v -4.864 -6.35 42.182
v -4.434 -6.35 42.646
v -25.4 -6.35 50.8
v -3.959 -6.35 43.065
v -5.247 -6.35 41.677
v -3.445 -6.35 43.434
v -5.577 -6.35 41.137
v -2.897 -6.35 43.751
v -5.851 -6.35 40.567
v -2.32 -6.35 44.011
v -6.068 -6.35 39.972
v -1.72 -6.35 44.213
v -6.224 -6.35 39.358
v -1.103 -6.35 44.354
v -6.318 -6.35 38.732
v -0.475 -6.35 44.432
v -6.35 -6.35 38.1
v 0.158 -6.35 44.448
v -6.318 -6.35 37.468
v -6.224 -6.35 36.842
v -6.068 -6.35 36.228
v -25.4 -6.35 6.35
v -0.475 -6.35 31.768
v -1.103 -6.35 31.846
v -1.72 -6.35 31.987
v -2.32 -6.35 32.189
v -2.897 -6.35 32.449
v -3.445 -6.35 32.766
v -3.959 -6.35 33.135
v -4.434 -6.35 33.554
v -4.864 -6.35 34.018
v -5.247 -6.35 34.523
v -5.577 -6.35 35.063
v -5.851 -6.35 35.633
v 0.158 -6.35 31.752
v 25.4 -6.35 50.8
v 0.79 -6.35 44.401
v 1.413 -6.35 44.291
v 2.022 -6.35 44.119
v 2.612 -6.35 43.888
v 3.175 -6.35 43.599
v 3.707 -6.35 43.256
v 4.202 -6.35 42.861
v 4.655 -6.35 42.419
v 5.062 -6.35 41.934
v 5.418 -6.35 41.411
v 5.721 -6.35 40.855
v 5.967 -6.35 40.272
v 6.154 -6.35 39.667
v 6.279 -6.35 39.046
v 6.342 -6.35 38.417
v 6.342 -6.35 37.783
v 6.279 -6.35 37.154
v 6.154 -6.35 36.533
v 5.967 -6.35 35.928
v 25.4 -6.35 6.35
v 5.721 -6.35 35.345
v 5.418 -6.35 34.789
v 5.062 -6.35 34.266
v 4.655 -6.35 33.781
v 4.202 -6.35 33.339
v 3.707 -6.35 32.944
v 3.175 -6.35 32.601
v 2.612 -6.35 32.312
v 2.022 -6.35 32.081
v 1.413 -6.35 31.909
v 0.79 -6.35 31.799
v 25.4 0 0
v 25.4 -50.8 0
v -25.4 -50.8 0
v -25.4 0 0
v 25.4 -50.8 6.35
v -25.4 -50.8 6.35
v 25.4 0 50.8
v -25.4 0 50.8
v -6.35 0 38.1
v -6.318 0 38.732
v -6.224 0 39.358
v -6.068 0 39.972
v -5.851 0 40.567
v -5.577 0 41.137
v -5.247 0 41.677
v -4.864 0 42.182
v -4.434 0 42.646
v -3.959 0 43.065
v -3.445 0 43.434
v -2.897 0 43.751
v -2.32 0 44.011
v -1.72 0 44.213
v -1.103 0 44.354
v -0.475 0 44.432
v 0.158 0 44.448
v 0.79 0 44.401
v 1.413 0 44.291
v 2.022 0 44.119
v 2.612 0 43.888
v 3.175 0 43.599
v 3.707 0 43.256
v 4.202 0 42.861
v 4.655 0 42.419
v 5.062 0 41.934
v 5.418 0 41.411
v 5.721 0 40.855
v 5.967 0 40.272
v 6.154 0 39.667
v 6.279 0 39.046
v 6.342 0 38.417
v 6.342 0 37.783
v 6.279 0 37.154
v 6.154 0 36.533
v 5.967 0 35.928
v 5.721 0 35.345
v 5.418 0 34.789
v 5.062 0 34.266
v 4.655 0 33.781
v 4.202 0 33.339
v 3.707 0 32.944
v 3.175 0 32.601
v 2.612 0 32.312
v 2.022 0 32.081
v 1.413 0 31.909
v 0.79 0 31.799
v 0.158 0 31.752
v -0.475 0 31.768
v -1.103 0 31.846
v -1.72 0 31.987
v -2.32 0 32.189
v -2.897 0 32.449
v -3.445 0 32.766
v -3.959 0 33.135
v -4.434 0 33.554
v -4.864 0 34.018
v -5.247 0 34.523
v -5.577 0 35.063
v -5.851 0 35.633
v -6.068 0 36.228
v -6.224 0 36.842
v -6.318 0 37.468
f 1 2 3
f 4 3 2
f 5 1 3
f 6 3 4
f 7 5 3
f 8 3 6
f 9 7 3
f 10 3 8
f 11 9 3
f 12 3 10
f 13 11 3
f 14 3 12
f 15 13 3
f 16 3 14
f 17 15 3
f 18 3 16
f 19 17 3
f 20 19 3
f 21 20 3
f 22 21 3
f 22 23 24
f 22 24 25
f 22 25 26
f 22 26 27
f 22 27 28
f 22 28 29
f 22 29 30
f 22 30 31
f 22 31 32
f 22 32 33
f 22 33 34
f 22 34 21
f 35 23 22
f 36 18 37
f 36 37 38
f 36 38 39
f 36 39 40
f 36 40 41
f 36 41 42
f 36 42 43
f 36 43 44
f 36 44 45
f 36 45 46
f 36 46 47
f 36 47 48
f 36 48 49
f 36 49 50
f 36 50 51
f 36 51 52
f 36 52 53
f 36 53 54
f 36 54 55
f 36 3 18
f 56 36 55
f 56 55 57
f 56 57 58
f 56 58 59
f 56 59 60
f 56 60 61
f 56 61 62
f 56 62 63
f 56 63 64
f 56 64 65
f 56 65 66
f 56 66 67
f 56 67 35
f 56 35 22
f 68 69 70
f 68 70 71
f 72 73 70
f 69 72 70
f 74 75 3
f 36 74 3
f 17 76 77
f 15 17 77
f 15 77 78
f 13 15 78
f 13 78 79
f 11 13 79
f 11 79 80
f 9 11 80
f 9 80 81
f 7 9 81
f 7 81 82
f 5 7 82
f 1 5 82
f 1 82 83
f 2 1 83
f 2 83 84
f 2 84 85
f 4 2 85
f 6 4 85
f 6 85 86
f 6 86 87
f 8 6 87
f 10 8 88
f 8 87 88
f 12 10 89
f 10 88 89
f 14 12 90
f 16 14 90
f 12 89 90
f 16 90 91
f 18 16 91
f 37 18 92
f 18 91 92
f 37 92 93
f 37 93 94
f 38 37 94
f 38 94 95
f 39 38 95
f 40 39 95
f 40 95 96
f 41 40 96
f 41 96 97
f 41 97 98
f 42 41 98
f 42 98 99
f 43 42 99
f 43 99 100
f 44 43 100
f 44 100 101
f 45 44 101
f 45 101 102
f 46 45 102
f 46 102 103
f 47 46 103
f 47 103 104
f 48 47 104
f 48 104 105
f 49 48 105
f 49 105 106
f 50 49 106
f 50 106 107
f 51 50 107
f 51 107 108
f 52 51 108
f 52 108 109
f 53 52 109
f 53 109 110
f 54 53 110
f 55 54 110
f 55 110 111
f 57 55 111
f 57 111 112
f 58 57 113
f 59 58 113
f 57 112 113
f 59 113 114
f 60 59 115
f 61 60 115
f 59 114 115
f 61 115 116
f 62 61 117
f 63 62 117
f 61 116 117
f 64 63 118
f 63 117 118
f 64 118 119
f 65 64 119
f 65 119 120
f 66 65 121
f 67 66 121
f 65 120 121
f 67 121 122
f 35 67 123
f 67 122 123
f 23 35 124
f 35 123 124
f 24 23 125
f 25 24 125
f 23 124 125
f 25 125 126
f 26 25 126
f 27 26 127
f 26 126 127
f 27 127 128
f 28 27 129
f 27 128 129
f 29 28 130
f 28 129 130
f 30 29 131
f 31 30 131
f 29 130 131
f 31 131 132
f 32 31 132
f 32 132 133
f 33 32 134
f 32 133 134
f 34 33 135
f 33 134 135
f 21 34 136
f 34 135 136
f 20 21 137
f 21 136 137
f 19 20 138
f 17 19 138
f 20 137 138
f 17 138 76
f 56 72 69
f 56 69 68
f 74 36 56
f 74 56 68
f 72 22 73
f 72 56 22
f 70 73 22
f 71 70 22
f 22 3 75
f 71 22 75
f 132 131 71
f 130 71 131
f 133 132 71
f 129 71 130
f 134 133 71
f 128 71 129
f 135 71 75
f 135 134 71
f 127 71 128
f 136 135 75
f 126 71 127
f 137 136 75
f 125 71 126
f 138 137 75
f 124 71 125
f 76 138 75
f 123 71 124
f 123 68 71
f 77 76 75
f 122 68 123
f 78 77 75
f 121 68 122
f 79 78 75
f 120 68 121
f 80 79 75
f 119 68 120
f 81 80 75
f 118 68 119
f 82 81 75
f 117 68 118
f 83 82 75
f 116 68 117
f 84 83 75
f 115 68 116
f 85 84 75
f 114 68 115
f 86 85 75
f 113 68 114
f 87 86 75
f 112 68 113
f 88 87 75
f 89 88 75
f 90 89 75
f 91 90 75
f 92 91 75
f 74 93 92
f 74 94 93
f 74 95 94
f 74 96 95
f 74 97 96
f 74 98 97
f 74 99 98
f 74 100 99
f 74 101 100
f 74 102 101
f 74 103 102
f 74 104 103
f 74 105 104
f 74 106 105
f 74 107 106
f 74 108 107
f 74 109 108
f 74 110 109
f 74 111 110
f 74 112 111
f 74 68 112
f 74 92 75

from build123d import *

# Parameters (mm, degrees)
F1_DEPTH = 25.4
F3_D     = 12.7


with BuildPart() as f1:
    # F0 (on Right) → F1 (new body, symmetric)
    with BuildSketch(Plane.YZ):
        Polygon((-50.8, 6.35), (-50.8, 0), (0, 0), (0, 50.8), (-6.35, 50.8), (-6.35, 6.35), align=None)
    extrude(amount=F1_DEPTH, both=True)

    # F3 (through all)
    with Locations(Plane.XZ.offset(6.35)):
        with Locations((0, 38.1)):
            Hole(F3_D / 2)


solid = f1.part
